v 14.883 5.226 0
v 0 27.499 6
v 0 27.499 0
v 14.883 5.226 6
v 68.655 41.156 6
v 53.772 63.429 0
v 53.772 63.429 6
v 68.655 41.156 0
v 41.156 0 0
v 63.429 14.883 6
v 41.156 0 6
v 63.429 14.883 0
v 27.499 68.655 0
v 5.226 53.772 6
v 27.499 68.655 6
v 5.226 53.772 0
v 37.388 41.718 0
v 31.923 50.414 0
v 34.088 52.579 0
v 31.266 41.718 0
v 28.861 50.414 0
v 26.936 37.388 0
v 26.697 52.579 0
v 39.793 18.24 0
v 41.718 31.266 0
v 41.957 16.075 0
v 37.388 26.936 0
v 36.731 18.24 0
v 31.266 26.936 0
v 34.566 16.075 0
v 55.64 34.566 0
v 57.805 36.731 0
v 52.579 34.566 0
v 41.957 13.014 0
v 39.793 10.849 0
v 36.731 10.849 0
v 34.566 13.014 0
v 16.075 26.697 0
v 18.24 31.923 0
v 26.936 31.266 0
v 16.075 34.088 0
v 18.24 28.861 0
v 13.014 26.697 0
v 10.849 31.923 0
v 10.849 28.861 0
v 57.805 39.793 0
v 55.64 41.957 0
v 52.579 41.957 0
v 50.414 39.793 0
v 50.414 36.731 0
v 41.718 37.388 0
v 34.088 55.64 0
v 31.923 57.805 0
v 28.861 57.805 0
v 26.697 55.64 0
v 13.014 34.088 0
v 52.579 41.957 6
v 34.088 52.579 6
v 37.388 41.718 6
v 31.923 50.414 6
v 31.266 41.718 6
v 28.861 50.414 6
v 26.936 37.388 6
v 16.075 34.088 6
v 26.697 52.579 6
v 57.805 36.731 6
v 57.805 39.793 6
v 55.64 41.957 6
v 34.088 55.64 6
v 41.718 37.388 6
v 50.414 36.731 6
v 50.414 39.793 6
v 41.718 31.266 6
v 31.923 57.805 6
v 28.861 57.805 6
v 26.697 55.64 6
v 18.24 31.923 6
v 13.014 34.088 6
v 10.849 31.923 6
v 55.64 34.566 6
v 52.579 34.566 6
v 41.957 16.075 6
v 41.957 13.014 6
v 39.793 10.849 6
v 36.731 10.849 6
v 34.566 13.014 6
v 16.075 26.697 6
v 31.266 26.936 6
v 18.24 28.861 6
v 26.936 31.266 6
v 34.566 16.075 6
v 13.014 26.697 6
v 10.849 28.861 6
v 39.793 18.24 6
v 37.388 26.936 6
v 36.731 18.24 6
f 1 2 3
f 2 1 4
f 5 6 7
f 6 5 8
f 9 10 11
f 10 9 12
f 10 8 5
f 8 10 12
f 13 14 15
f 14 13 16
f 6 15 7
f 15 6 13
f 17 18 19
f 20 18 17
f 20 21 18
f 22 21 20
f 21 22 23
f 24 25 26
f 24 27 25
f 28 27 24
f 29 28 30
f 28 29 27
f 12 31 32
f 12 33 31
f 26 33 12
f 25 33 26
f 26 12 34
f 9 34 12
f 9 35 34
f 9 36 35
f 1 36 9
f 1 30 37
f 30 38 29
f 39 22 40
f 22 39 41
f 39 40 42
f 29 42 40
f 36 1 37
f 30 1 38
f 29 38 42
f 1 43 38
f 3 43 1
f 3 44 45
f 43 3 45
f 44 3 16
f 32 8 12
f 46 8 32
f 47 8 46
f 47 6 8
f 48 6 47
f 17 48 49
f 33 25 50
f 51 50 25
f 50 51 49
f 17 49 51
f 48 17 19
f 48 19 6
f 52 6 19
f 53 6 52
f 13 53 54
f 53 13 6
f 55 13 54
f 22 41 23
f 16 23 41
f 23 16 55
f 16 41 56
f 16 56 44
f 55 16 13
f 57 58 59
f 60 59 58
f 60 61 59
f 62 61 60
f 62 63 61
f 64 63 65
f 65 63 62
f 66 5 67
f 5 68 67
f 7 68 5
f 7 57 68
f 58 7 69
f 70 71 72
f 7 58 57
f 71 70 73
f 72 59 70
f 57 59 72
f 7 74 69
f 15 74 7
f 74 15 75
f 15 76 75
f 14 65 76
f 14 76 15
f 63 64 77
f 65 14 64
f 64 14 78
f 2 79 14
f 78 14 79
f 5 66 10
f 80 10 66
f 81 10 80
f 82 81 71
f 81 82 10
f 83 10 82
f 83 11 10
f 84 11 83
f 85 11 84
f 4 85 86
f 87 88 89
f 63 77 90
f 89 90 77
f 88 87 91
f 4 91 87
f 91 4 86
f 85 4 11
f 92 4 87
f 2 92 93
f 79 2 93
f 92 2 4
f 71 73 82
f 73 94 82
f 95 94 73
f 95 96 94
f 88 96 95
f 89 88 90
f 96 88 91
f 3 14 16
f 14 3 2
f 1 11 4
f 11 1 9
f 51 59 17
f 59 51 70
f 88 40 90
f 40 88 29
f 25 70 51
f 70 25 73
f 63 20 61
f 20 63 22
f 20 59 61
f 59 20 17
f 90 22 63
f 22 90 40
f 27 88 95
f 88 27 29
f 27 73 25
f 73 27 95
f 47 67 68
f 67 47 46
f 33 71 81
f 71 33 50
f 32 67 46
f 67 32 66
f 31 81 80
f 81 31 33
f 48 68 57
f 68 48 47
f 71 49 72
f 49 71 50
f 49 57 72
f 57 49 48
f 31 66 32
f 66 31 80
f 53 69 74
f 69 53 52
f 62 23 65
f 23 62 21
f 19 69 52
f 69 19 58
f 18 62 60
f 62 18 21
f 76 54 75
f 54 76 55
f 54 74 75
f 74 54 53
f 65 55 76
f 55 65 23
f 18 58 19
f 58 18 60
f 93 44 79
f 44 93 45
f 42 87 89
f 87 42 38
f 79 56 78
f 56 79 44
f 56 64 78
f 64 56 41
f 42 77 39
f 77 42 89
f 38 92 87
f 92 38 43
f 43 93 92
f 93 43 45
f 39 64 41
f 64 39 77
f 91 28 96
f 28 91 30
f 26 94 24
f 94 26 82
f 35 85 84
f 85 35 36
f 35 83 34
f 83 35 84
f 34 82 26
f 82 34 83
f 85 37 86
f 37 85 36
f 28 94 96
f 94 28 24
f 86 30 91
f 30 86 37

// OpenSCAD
$fn = 32;

// ----------------------------------------------------------------------
// Polygon plate: 8-gon R35, 4 bolt windows
// ----------------------------------------------------------------------

// --- parameters (mm) ---
sides = 8;                // number of polygon sides
plate_r = 35;             // circumscribed radius of the polygon
bore_r = 8;               // centre bore radius
bolts = 4;                // number of bolt windows
ring_r = 20.17;           // bolt-circle radius
bolt_r = 4;               // bolt window radius
plate_t = 6;              // plate thickness, Z (extrusion height)

plate_d = 2 * plate_r;  // circumscribed diameter
bore_d = 2 * bore_r;  // centre bore diameter
bolt_d = 2 * bolt_r;  // bolt window diameter
ring_d = 2 * ring_r;  // bolt-circle diameter

profile = [[68.655, 41.156], [53.772, 63.429], [27.499, 68.655], [5.226, 53.772], [0, 27.499], [14.883, 5.226], [41.156, 0], [63.429, 14.883]];  // primary outline, 8 points, counter clockwise
void_1 = [[41.718, 37.388], [37.388, 41.718], [31.266, 41.718], [26.936, 37.388], [26.936, 31.266], [31.266, 26.936], [37.388, 26.936], [41.718, 31.266]];  // centre bore, 8 points
void_2 = [[57.805, 39.793], [55.64, 41.957], [52.579, 41.957], [50.414, 39.793], [50.414, 36.731], [52.579, 34.566], [55.64, 34.566], [57.805, 36.731]];  // bolt window 1, 8 points
void_3 = [[34.088, 55.64], [31.923, 57.805], [28.861, 57.805], [26.697, 55.64], [26.697, 52.579], [28.861, 50.414], [31.923, 50.414], [34.088, 52.579]];  // bolt window 2, 8 points
void_4 = [[18.24, 31.923], [16.075, 34.088], [13.014, 34.088], [10.849, 31.923], [10.849, 28.861], [13.014, 26.697], [16.075, 26.697], [18.24, 28.861]];  // bolt window 3, 8 points
void_5 = [[41.957, 16.075], [39.793, 18.24], [36.731, 18.24], [34.566, 16.075], [34.566, 13.014], [36.731, 10.849], [39.793, 10.849], [41.957, 13.014]];  // bolt window 4, 8 points

// --- the one profile operation ---
difference() {
  linear_extrude(height = plate_t) polygon(points = profile);
  translate([0, 0, -1])
    linear_extrude(height = plate_t + 2) polygon(points = void_1);
  translate([0, 0, -1])
    linear_extrude(height = plate_t + 2) polygon(points = void_2);
  translate([0, 0, -1])
    linear_extrude(height = plate_t + 2) polygon(points = void_3);
  translate([0, 0, -1])
    linear_extrude(height = plate_t + 2) polygon(points = void_4);
  translate([0, 0, -1])
    linear_extrude(height = plate_t + 2) polygon(points = void_5);
}
